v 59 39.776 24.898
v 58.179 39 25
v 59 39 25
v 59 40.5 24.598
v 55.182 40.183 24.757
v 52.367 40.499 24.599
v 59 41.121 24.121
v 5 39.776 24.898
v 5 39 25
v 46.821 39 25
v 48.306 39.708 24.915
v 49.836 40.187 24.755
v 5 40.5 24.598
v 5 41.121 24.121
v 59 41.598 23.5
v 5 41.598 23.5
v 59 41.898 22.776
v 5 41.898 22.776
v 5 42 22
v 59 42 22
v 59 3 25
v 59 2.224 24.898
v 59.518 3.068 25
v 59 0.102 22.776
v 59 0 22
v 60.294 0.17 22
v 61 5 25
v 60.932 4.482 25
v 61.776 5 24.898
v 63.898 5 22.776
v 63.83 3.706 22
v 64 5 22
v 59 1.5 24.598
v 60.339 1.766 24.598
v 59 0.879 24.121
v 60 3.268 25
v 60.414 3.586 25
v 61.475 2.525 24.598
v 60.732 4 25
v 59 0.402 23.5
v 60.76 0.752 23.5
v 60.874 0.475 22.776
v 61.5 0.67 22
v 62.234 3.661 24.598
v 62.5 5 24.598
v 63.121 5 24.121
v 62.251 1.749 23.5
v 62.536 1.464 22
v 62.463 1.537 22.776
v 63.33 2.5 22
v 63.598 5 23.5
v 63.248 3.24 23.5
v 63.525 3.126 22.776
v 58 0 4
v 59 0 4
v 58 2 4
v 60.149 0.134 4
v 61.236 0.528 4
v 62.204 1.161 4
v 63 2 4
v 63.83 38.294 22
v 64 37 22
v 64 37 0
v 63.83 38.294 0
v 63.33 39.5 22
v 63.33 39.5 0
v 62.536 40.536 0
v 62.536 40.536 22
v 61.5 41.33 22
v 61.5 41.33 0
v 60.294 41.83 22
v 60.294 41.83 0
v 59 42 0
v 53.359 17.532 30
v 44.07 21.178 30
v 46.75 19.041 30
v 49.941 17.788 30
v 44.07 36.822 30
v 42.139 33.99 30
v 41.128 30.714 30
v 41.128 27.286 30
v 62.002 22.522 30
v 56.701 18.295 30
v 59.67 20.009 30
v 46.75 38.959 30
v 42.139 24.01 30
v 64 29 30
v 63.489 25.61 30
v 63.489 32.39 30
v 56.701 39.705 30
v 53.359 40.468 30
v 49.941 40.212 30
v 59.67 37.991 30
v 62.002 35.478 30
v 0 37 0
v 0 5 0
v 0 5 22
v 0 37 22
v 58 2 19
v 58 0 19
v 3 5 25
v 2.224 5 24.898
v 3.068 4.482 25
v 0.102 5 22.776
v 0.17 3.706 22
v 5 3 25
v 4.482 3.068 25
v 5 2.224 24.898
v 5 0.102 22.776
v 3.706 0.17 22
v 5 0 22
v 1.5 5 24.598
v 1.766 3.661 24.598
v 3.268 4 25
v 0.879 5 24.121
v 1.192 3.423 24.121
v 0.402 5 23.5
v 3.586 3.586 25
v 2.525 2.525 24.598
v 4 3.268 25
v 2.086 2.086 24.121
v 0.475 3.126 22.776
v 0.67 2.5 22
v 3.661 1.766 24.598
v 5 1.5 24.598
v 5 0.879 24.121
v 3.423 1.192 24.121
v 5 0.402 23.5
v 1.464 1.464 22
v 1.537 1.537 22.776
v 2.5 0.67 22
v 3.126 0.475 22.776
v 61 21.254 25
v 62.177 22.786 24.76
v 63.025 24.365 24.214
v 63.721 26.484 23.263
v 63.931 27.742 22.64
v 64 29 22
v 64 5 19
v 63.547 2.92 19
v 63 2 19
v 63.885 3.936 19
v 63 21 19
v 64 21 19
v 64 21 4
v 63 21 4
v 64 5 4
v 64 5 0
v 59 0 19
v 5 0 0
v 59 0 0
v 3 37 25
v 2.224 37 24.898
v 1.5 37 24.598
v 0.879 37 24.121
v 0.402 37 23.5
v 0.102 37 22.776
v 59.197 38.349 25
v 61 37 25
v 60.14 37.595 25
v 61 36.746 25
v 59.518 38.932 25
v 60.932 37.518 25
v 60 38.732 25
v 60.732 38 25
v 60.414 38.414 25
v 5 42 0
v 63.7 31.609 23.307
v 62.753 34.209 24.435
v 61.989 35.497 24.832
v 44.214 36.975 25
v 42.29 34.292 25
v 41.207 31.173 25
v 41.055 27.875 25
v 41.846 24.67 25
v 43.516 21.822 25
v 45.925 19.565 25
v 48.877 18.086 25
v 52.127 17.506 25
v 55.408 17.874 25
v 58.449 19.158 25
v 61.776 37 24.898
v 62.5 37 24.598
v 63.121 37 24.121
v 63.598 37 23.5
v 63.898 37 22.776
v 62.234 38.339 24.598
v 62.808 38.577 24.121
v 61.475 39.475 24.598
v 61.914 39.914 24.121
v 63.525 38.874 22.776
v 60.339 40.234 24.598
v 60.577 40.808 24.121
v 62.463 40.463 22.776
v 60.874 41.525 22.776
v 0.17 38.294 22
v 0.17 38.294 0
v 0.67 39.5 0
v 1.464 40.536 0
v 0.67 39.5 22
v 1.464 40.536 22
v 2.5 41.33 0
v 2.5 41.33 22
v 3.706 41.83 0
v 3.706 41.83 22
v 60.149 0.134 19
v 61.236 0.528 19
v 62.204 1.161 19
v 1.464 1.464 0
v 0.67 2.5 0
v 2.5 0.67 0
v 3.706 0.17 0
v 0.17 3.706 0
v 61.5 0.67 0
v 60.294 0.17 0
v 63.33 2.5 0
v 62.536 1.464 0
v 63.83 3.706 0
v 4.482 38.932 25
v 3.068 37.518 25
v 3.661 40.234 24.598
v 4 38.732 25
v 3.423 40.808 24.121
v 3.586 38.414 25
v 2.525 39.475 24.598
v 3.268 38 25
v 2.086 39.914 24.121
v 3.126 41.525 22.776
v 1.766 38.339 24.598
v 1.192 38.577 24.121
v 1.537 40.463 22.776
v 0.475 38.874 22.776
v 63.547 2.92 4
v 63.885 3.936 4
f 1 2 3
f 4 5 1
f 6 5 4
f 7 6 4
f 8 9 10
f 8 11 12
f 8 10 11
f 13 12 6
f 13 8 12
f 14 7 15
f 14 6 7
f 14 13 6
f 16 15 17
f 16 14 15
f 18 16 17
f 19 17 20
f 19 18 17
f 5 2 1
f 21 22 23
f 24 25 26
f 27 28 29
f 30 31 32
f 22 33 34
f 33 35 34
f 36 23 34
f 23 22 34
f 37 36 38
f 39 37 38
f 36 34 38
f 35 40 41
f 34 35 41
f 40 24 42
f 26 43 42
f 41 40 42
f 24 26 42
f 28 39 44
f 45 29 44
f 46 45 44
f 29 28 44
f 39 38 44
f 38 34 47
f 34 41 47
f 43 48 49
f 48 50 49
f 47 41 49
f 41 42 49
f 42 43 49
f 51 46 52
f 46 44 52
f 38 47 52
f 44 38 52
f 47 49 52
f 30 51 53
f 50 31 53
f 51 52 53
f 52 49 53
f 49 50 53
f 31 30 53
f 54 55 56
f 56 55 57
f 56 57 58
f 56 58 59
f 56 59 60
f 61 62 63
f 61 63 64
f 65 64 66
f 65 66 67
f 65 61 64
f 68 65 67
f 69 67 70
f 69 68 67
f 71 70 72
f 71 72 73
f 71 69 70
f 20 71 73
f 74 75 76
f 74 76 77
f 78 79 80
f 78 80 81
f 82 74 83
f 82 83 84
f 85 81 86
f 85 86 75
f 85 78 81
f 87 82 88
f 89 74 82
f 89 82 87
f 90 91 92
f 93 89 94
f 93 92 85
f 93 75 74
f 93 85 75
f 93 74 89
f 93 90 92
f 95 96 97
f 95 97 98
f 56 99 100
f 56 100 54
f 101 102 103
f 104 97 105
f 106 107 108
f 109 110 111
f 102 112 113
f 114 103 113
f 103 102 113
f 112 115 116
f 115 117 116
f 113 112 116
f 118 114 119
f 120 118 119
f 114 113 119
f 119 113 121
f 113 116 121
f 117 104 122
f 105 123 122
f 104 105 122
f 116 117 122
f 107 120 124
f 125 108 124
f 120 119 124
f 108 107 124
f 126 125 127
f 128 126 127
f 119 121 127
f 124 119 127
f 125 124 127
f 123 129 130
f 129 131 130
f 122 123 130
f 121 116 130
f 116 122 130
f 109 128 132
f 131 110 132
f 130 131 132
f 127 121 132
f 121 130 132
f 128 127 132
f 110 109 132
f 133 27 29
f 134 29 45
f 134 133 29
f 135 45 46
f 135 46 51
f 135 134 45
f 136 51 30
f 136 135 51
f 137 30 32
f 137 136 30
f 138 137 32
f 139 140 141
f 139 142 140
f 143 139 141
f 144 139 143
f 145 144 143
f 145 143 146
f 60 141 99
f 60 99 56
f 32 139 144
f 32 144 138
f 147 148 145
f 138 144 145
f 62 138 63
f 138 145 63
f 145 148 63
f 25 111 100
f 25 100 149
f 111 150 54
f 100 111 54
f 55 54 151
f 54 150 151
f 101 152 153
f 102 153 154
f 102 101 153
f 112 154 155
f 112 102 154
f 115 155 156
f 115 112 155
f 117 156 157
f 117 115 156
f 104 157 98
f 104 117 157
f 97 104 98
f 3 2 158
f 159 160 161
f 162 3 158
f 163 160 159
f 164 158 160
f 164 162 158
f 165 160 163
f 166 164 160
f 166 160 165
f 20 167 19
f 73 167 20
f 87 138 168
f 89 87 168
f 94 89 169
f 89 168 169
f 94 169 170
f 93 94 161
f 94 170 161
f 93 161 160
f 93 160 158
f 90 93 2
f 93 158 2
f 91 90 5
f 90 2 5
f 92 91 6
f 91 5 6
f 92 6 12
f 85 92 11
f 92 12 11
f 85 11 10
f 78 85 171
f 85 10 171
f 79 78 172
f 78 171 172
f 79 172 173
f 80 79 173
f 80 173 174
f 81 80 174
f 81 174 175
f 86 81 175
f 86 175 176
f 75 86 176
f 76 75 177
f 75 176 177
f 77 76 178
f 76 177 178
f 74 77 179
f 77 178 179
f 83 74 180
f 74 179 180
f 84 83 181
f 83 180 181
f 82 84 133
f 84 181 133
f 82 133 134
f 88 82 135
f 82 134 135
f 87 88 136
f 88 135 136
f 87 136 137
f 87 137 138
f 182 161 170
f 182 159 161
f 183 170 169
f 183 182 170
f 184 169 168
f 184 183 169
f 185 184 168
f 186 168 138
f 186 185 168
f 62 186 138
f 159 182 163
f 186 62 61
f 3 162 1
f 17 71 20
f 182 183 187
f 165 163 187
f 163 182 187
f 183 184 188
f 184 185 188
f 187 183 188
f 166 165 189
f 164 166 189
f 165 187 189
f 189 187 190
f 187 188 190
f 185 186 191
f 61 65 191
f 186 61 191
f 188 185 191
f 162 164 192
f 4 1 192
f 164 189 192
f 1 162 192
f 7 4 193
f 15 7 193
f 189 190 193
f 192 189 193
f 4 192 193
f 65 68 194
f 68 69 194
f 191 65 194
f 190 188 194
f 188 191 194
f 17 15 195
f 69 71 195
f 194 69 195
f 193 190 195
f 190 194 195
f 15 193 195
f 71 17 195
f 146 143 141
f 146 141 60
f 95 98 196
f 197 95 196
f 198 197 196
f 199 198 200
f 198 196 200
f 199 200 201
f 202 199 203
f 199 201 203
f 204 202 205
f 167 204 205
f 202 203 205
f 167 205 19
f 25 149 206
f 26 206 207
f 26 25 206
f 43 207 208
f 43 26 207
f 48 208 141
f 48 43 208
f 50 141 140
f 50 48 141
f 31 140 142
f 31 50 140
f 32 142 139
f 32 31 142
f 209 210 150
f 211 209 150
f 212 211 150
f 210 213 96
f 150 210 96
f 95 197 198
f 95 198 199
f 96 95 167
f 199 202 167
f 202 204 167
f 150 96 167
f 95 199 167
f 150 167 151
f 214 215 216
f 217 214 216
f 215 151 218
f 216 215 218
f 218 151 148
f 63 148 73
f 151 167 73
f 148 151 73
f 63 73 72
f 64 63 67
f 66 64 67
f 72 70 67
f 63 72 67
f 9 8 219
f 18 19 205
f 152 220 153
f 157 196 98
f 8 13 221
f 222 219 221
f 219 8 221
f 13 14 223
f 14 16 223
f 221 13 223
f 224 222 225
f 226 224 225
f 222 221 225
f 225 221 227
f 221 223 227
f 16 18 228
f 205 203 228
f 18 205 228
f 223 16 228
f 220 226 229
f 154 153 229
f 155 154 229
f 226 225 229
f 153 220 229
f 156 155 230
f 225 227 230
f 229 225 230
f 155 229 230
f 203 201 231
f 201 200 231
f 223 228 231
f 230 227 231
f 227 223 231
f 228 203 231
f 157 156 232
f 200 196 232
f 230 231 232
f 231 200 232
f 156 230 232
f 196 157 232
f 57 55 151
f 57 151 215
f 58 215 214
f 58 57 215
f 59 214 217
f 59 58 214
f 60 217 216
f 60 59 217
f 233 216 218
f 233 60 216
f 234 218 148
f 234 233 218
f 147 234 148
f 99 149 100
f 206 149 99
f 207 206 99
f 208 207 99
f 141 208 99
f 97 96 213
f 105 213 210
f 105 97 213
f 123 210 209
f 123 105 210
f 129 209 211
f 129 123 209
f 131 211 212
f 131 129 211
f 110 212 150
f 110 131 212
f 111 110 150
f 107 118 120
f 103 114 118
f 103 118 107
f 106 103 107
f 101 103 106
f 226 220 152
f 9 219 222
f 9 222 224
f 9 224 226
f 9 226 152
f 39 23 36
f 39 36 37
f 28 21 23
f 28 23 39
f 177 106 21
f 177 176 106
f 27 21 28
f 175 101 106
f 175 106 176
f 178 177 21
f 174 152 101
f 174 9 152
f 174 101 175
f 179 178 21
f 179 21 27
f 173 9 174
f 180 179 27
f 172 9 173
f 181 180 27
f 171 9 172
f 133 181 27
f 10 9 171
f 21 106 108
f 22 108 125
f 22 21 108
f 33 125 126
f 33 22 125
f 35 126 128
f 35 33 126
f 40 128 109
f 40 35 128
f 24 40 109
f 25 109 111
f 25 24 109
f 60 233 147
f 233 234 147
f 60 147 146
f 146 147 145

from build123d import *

# Parameters (mm, degrees)
SKETCH1_W           = 64
SKETCH1_H           = 42
BOSS_EXTRUDE1_DEPTH = 25
FILLET2_R           = 5
FILLET4_R           = 3
BOSS_EXTRUDE3_START = -3
SKETCH2_R           = 11.5
BOSS_EXTRUDE3_DEPTH = 8
SKETCH3_W           = 15
SKETCH3_H           = 21
CUT_EXTRUDE1_DEPTH  = 1
SKETCH4_W           = 15
SKETCH4_H           = 2
CUT_EXTRUDE2_DEPTH  = 5


with BuildPart() as part:
    # Sketch1 → Boss-Extrude1 (new body)
    with BuildSketch(Plane.XY):
        with Locations((32, 21)):
            Rectangle(SKETCH1_W, SKETCH1_H)
    extrude(amount=BOSS_EXTRUDE1_DEPTH)

    # Fillet2
    fillet2_edges = [part.edges().sort_by_distance(p)[0] for p in [
        (0, 42, 12.5),
        (64, 42, 12.5),
        (64, 0, 12.5),
        (0, 0, 12.5),
    ]]
    fillet(fillet2_edges, radius=FILLET2_R)

    # Fillet4
    fillet4_edges = [part.edges().sort_by_distance(p)[0] for p in [
        (64, 21, 25),
        (32, 0, 25),
        (0, 21, 25),
        (32, 42, 25),
        (62.535533906, 40.535533906, 25),
        (1.464466094, 40.535533906, 25),
        (1.464466094, 1.464466094, 25),
        (62.535533906, 1.464466094, 25),
    ]]
    fillet(fillet4_edges, radius=FILLET4_R)

    # Sketch2 → Boss-Extrude3 (add)
    with BuildSketch(Plane.XY.offset(25).offset(BOSS_EXTRUDE3_START)):
        with Locations((52.5, 29)):
            Circle(SKETCH2_R)
    extrude(amount=BOSS_EXTRUDE3_DEPTH)

    # Sketch3 → Cut-Extrude1 (cut)
    with BuildSketch(Plane(origin=(64, 0, 0), x_dir=(0, 0, -1), z_dir=(1, 0, 0))):
        with Locations((-11.5, 10.5)):
            Rectangle(SKETCH3_W, SKETCH3_H)
    extrude(amount=-CUT_EXTRUDE1_DEPTH, mode=Mode.SUBTRACT)

    # Sketch4 → Cut-Extrude2 (cut)
    with BuildSketch(Plane(origin=(63, 0, 0), x_dir=(0, 0, -1), z_dir=(1, 0, 0))):
        with Locations((-11.5, 1)):
            Rectangle(SKETCH4_W, SKETCH4_H)
    extrude(amount=-CUT_EXTRUDE2_DEPTH, mode=Mode.SUBTRACT)


solid = part.part
